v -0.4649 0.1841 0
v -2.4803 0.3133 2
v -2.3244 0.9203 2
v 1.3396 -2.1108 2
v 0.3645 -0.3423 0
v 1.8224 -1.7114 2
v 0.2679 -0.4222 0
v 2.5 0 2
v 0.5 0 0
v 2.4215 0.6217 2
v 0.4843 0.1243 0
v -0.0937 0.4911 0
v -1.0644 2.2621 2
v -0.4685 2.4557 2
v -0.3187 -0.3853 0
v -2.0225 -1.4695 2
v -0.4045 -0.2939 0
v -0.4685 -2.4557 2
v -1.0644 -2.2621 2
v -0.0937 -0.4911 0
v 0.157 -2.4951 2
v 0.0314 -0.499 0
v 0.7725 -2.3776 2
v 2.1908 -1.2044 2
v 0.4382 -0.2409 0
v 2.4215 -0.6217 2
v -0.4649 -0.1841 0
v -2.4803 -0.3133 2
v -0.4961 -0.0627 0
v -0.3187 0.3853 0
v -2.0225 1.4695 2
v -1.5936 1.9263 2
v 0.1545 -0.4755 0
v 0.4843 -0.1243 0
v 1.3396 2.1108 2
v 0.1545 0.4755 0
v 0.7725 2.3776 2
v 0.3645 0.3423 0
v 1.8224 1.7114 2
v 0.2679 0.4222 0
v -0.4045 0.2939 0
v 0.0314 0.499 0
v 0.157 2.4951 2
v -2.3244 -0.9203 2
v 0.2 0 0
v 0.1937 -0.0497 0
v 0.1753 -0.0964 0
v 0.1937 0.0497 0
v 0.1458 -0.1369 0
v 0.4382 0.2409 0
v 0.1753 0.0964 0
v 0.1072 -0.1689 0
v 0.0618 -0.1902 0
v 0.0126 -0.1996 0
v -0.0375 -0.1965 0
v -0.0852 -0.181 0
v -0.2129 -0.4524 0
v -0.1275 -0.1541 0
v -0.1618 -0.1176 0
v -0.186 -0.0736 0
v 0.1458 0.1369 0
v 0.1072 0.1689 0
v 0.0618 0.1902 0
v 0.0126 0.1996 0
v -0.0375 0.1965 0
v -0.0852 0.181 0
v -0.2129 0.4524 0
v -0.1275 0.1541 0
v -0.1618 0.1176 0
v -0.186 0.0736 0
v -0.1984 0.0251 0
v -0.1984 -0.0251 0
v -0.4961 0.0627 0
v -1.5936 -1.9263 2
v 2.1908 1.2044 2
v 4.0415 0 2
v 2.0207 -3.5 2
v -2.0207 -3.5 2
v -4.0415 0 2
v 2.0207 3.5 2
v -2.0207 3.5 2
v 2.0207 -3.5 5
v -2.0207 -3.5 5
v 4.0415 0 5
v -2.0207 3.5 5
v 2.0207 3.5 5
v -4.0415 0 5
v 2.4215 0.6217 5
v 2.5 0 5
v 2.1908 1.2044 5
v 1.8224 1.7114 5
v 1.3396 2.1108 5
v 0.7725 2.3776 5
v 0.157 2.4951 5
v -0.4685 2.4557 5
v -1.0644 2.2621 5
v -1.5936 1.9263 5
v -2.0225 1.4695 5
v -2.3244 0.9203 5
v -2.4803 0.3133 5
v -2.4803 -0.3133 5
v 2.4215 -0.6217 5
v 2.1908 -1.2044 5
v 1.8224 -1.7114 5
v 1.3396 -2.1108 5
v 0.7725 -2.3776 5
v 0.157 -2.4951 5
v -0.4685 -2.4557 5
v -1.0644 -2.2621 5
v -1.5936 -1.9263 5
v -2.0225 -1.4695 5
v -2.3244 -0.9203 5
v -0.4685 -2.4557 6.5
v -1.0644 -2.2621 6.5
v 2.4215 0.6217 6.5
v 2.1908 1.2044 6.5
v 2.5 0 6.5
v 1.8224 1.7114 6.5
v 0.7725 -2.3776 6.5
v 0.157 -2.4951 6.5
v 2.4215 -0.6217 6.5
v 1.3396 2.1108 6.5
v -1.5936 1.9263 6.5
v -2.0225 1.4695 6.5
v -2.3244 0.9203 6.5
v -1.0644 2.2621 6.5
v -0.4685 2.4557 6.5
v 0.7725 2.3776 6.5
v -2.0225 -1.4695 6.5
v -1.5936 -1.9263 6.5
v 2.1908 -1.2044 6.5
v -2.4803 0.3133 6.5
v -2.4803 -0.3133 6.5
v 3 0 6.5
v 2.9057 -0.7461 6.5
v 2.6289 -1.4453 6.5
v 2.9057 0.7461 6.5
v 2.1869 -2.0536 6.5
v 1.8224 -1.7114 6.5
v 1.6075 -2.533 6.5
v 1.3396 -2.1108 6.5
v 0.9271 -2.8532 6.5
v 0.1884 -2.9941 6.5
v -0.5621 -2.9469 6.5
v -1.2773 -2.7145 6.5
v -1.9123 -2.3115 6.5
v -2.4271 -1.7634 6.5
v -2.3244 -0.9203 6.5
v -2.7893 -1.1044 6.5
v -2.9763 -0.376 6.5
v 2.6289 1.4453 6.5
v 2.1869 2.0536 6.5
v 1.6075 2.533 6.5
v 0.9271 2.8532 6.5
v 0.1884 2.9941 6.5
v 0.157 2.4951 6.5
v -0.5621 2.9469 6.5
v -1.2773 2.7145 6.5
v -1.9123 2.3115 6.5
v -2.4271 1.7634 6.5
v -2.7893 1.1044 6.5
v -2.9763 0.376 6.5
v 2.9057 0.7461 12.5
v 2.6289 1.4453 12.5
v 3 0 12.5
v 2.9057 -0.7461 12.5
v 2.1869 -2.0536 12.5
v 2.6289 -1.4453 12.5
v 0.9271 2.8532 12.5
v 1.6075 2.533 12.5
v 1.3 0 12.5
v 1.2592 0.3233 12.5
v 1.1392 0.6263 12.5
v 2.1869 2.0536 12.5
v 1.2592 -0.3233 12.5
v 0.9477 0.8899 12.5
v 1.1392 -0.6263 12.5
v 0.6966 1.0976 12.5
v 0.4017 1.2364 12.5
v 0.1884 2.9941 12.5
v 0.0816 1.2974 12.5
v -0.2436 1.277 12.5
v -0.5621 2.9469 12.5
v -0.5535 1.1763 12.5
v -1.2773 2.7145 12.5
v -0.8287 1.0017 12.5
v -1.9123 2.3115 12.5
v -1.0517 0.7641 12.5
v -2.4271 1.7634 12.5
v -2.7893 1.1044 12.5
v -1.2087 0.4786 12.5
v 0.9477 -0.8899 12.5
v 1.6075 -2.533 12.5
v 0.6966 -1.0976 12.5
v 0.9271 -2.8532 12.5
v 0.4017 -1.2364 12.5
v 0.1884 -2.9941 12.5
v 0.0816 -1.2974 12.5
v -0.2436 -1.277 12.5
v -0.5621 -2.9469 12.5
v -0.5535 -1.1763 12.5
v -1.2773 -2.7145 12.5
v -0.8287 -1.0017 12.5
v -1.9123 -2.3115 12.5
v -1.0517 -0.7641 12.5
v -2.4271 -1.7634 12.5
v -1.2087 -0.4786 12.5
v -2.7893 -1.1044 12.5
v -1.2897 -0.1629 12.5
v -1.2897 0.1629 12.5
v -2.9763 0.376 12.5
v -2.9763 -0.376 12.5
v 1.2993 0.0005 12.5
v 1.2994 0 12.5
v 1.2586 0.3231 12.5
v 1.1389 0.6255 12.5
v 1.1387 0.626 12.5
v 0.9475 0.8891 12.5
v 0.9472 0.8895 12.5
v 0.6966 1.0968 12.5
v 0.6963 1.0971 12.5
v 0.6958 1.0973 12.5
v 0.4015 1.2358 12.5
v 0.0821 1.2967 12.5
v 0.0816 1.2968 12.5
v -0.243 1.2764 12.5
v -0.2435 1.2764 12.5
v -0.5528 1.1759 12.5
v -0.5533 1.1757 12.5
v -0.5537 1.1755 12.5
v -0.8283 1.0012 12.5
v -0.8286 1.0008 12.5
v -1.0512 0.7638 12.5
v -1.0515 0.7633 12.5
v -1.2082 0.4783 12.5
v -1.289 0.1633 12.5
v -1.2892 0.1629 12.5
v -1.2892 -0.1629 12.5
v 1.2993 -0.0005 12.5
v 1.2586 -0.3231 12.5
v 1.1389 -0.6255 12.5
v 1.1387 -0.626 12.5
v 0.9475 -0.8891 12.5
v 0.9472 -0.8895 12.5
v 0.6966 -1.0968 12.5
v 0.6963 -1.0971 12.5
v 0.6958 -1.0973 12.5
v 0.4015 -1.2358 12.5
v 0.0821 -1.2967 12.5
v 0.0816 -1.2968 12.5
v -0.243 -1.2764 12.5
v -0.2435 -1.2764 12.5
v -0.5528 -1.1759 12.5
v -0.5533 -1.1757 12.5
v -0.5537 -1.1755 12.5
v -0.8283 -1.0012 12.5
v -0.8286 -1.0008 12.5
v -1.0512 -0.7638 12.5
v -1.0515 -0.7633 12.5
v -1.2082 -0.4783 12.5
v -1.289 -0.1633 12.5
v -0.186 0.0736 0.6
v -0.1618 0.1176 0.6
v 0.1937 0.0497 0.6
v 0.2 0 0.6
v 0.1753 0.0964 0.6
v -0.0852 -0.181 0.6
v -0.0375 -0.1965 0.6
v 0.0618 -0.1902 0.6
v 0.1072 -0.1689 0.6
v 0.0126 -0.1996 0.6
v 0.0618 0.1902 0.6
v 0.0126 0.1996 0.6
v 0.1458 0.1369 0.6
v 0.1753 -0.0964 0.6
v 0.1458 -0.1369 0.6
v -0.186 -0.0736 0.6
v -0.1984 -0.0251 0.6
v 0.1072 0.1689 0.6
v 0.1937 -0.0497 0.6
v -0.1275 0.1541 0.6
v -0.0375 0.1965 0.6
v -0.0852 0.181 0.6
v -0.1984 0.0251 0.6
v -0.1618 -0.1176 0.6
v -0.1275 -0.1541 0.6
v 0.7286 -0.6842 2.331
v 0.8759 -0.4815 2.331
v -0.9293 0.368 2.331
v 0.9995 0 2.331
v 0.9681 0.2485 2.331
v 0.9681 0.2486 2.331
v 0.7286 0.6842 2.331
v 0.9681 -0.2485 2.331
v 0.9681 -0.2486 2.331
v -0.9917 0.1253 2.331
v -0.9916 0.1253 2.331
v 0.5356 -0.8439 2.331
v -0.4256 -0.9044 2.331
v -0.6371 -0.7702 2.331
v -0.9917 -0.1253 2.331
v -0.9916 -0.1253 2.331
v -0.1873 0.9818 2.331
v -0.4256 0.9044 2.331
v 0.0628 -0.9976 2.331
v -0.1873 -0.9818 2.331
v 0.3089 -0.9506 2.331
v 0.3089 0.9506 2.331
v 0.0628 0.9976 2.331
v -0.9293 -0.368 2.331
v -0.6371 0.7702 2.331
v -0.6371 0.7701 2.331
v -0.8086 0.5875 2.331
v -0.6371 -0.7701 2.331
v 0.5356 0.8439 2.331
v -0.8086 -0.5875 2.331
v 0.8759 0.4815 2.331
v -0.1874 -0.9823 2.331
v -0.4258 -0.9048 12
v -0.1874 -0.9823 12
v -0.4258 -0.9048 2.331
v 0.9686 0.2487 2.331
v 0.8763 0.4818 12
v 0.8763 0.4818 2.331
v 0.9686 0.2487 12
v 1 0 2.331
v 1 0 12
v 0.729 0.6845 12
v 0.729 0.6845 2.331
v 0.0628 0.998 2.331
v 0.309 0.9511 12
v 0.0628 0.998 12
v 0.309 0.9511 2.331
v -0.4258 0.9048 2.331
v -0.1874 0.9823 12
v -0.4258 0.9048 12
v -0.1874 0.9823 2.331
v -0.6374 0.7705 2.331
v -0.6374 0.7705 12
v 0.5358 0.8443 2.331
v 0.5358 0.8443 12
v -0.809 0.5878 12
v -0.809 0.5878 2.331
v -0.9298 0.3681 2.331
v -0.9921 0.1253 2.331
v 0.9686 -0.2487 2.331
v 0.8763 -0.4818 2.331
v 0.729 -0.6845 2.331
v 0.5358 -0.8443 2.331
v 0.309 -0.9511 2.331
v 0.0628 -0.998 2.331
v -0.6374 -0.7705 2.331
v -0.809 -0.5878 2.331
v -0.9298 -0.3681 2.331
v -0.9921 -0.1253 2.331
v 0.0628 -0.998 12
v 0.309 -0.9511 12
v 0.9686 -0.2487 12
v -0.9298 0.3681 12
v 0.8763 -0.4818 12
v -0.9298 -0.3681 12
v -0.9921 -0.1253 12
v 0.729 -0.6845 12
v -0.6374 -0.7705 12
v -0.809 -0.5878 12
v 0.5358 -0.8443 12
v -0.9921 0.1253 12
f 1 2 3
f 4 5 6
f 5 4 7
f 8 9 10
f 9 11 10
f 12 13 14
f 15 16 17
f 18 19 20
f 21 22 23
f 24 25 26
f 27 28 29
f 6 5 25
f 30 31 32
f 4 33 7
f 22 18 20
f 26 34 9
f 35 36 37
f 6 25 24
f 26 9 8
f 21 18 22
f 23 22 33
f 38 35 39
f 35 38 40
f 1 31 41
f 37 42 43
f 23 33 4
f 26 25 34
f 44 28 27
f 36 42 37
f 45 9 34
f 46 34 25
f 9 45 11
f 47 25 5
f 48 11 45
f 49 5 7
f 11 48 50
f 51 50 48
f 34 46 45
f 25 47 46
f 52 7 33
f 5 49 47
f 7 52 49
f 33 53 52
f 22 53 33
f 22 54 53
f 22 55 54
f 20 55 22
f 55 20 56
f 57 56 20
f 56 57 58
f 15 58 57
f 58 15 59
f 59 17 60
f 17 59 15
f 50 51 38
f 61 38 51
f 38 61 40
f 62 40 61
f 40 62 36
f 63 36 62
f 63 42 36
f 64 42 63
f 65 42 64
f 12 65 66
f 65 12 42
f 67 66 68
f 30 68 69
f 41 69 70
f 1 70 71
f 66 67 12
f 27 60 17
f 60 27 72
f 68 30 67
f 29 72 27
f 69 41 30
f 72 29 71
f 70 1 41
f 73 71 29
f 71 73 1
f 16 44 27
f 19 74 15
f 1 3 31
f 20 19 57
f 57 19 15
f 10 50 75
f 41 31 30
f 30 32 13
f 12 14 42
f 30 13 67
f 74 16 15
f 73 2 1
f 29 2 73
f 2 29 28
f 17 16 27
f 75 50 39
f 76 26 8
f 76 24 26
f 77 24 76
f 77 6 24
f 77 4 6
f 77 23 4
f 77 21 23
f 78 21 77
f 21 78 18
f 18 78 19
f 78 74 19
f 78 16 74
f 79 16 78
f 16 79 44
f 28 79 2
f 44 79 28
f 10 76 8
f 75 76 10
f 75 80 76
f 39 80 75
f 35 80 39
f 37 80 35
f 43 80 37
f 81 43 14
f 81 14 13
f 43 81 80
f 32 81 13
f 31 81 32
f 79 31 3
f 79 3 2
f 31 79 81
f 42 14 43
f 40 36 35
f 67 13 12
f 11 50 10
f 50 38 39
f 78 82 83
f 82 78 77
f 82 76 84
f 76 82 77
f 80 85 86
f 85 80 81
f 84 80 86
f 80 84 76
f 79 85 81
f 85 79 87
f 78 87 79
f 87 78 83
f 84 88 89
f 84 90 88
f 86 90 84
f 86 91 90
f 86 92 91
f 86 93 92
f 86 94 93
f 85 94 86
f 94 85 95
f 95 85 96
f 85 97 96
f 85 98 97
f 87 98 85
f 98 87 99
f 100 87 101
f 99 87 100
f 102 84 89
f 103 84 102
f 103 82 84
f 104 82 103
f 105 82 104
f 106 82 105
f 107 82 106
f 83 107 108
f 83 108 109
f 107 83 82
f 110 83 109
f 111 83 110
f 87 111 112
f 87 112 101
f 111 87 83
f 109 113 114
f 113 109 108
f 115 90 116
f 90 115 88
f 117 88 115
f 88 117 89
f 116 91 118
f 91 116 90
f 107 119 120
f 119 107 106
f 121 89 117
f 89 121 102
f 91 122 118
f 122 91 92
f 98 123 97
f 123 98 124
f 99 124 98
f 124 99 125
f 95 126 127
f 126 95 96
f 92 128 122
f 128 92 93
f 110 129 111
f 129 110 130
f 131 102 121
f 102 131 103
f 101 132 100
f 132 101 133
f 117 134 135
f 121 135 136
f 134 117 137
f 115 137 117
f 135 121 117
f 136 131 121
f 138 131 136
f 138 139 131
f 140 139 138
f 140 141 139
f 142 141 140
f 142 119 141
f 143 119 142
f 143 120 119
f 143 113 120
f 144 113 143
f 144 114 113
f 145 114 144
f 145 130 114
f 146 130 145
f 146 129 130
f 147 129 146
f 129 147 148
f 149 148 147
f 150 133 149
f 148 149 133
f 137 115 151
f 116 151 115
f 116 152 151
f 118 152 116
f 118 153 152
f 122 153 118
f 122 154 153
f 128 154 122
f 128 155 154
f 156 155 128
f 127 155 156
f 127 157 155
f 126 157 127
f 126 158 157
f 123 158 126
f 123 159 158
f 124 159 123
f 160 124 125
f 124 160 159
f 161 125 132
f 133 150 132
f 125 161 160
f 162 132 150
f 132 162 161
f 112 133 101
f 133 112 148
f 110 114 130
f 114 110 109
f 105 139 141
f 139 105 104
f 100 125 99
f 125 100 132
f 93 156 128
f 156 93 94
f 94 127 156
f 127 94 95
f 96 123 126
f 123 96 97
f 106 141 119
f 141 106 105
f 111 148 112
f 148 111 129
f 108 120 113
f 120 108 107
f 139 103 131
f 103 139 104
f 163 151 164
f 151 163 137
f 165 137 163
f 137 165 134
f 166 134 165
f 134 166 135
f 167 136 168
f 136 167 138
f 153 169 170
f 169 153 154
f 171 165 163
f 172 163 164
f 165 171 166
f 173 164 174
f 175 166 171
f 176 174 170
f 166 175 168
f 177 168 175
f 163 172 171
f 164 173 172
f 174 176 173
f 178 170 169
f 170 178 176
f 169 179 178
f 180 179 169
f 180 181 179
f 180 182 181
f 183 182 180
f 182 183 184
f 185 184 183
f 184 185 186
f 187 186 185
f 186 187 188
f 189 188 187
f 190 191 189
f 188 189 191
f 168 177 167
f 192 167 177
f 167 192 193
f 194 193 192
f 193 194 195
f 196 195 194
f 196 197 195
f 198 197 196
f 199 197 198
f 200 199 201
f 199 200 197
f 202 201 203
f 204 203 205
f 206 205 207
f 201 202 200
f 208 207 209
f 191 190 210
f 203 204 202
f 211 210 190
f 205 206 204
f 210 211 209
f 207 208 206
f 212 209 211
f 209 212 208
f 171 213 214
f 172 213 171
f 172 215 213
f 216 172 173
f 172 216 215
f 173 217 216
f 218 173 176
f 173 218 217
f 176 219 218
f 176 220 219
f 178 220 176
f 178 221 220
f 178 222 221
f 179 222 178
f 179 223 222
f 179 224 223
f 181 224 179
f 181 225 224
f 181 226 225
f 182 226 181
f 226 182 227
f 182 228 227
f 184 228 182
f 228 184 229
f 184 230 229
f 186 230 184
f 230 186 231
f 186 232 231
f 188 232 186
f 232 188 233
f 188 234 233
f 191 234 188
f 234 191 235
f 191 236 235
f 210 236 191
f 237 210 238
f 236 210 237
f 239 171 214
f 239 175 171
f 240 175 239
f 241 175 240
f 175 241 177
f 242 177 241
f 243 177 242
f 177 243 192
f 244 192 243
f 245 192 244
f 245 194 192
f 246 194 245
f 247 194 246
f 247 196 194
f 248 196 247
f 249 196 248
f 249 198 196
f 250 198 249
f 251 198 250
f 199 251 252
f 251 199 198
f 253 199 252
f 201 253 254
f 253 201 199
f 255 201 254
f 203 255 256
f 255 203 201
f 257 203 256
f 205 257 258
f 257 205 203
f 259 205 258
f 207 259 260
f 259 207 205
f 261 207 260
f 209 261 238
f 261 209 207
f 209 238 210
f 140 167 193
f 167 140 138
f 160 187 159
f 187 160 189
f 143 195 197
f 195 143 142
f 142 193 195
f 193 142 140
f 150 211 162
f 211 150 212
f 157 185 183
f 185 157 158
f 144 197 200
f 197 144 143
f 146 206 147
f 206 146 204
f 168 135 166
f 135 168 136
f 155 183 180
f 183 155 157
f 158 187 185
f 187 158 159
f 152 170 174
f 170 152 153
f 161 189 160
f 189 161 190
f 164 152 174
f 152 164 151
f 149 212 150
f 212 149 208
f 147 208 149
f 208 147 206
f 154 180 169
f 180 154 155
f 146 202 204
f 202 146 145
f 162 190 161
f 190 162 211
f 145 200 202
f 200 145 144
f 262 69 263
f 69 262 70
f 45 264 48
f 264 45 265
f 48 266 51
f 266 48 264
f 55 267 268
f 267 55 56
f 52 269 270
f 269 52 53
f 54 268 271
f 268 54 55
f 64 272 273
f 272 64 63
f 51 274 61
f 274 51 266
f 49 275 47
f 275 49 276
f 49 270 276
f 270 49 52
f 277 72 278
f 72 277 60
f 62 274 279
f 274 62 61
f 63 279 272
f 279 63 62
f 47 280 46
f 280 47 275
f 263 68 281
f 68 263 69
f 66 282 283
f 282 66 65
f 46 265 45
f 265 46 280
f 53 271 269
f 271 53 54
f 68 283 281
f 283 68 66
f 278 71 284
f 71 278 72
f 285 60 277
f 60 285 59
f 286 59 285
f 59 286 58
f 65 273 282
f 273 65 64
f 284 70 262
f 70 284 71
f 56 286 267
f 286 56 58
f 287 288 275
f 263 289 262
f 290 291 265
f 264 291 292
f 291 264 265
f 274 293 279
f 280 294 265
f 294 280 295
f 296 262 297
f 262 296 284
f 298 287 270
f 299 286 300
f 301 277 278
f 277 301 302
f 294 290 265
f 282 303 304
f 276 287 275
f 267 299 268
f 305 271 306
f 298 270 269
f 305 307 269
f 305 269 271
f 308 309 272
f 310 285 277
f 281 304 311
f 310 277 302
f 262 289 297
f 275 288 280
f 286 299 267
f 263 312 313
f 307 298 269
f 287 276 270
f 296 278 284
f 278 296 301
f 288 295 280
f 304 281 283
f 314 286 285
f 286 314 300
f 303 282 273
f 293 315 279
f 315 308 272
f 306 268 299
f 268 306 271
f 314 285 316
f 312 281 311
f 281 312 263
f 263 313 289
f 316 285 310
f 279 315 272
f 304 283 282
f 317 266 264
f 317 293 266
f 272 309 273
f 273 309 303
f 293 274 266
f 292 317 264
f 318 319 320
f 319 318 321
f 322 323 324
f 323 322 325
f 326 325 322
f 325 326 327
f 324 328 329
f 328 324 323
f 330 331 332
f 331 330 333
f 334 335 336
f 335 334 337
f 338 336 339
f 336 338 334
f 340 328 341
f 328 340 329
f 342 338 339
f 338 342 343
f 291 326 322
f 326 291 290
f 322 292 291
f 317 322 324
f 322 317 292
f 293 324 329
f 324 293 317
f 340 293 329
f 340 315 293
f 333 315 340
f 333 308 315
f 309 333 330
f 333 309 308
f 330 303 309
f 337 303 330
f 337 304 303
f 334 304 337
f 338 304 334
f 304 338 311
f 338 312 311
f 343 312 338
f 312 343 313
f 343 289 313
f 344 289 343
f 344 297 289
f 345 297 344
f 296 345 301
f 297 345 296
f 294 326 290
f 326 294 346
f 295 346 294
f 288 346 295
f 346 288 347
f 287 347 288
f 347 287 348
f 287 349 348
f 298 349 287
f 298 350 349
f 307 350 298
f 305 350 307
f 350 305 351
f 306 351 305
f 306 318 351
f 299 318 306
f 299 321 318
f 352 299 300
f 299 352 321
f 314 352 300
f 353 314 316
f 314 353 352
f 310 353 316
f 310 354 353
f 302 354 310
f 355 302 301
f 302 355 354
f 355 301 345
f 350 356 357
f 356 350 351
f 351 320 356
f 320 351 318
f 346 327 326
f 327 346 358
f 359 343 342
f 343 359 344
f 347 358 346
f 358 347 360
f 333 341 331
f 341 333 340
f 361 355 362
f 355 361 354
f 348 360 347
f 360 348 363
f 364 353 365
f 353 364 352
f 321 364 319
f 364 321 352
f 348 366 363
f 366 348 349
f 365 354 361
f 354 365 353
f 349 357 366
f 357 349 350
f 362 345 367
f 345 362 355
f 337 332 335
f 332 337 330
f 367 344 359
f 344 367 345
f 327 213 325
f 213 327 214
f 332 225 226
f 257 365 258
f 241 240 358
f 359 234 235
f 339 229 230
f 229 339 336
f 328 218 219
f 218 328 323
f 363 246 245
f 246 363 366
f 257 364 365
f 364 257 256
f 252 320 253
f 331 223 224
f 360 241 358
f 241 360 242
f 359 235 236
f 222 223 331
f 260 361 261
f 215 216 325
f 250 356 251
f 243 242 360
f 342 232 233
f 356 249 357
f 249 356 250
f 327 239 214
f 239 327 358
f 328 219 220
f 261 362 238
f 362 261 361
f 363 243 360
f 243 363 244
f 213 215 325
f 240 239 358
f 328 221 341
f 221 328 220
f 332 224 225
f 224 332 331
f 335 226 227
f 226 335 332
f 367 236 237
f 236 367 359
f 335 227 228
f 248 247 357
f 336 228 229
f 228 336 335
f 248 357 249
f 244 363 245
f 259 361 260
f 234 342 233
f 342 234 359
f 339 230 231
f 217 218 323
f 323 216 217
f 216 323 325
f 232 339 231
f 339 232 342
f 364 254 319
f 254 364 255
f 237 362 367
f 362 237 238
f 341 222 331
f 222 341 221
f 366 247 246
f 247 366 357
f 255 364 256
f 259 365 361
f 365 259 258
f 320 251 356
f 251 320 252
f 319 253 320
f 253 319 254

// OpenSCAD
// Copyright 2017 Pavel Penev
// https://www.thingiverse.com/pavpen/about
//
// You can use this file under Attribution-ShareAlike 4.0 International
// (CC BY-SA 4.0).
//
// If you need to use it under another license, send me a message.

length_a = 0.40; // Nozzle diameter
length_b = 1.00;
length_c = 0.60;
length_d = 2.0;
length_e = 2.6;

total_h = 12.5;
opening_section_top_outer_r = 2.5;
opening_section_h = 2;
wrench_section_side = 7 / sqrt(3);
wrench_section_side_count = 6;
wrench_section_outer_r = wrench_section_side;
wrench_section_h = 3;
neck_outer_r = 5 / 2;
neck_h = 1.5;
threaded_section_outer_r = 6 / 2;
threaded_section_h = 6;
top_hole_h = 0.5;

$fn = 25;

// Export functions:
function pro_pavpen_e3d_v6_nozzle_total_h() = total_h;


// Demo:
pro_pavpen_e3d_v6_nozzle();



module pro_pavpen_e3d_v6_nozzle()
{
    difference()
    {
        pro_pavpen_e3d_v6_nozzle_body();
        
        pro_pavpen_e3d_v6_nozzle_hole();
    }
}

module pro_pavpen_e3d_v6_nozzle_body(length_b = length_b)
{
    union()
    {
        // Opening section:
        cylinder(
            r1 = length_b / 2,
            r2 = opening_section_top_outer_r,
            h = opening_section_h);
        
        // Wrench section:
        translate([0, 0, opening_section_h])
        cylinder(
            r = wrench_section_outer_r,
            h = wrench_section_h,
            $fn = wrench_section_side_count);
        
        // Neck:
        translate([
            0,
            0,
            opening_section_h + wrench_section_h])
        cylinder(r = neck_outer_r, h =  neck_h);
        
        // Threaded section:
        translate([
            0,
            0,
            opening_section_h + wrench_section_h + neck_h])
        cylinder(
            r = threaded_section_outer_r,
            h = threaded_section_h);
    }
}

module pro_pavpen_e3d_v6_nozzle_hole(
    bottom_extra_h = 1,
    top_extra_h = 1
)
{
    overlap_h = 0.001;
    
    union()
    {
        // Extrusion opening:
        translate([0, 0, -bottom_extra_h])
        cylinder(
            r = length_a / 2,
            h = length_c + bottom_extra_h + overlap_h);
        
        // Transition hole:
        transition_hole_h = length_d / 2 * sqrt(3);
        
        translate([0, 0, length_c])
        cylinder(
            r1 = length_a / 2,
            r2 = length_d / 2,
            h = transition_hole_h);
        
        // Filament hole:
        translate([0, 0, length_c + transition_hole_h - overlap_h])
        cylinder(
            r = length_d / 2,
            h = total_h - transition_hole_h - length_c + 2 * overlap_h);
        
        // Top opening:
        translate([0, 0, total_h - top_hole_h])
        cylinder(
            r1 = length_d / 2,
            r2 = length_e / 2,
            h = top_hole_h + overlap_h);
        
        // Top extra hole:
        translate([0, 0, total_h])
        cylinder(r = length_e / 2, h = top_extra_h);
    }
}
